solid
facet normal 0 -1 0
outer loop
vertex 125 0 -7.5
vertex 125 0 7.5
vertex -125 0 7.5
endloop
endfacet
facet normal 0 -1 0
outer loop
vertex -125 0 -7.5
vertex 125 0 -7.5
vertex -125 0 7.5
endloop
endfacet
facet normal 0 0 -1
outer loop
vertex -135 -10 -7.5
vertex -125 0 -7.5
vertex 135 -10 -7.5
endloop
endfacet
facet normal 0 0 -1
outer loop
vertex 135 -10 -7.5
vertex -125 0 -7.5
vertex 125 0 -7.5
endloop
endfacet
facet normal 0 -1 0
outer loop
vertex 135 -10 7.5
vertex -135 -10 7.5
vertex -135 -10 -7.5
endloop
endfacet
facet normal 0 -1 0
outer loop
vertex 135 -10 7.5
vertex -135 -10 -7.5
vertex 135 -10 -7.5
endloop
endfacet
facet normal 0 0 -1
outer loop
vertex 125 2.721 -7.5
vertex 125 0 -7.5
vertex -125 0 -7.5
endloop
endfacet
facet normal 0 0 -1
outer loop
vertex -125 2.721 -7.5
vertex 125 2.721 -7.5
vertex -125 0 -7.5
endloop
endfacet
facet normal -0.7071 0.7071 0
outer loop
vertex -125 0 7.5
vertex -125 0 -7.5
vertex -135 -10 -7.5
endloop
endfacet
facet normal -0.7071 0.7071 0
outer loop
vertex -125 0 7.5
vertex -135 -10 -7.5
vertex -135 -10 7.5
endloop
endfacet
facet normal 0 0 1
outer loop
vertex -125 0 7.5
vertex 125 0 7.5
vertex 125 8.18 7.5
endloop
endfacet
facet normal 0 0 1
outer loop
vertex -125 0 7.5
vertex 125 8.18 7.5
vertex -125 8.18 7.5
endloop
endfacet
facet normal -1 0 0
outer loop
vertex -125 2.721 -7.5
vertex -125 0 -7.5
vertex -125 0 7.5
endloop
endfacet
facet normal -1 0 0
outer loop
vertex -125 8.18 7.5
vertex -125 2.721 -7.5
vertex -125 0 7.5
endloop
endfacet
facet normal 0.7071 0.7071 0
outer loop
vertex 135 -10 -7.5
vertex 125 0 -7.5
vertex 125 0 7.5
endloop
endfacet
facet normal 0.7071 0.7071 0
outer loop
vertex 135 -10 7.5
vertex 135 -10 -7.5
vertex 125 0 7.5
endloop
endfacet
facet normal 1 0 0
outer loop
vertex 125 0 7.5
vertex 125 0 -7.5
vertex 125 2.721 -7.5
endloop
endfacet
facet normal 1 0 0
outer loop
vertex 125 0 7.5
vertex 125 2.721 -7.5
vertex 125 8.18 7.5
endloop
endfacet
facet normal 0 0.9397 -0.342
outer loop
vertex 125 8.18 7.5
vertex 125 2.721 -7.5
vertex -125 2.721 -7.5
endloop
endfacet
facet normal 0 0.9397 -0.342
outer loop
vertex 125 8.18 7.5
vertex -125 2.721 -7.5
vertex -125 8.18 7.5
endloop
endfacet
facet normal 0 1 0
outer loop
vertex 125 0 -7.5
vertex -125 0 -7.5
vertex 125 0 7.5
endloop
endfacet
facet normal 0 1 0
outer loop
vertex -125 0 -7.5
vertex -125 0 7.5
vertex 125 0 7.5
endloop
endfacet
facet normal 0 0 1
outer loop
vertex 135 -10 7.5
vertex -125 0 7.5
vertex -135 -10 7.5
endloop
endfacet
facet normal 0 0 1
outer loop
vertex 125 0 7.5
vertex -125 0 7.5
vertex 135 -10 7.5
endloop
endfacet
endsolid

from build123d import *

# Parameters (mm, degrees)
F0_W        = 270
F0_H        = 15
F1_DEPTH    = 10
F2_SIZE     = 9.99999
F3_W        = 250.00002
F3_H        = 15
F4_DEPTH    = 10
F5_T1_DEPTH = 353.767809302


# Not quite as in the source:
# - a fillet or chamfer that OpenCascade refuses, or shapes differently, is made with other operations: its cross-section is extruded or revolved along the edge and cut away or added
# - a fillet or chamfer is up to 0.001 mm smaller than in the source, because OpenCascade refuses the exact size
# - a feature of the source that left no trace in its solid (it failed there, or was rolled back) is left out


with BuildPart() as f1:
    # F0 (on Front) → F1 (new body)
    with BuildSketch(Plane.XZ):
        Rectangle(F0_W, F0_H)
    extrude(amount=F1_DEPTH)

    # F2 (size 10 in the source; OpenCascade refuses exactly that, so slightly less here)
    f2_edges = [f1.edges().sort_by_distance(p)[0] for p in [
        (135, 0, 0),
        (-135, 0, 0),
    ]]
    chamfer(f2_edges, length=F2_SIZE)


with BuildPart() as f4:
    # F3 (on face) → F4 (new body)
    with BuildSketch(Plane(origin=(0, 0, 0), x_dir=(-1, 0, 0), z_dir=(0, 1, 0))):
        Rectangle(F3_W, F3_H)
    extrude(amount=F4_DEPTH)

    # F5: chamfer of 20 x 7.2794046853 on 1 edges, made by hand

    # F5_s2 → F5_t1 (cut)
    with BuildSketch(Plane.YZ.offset(-176.883904651)):
        Polygon((2.7205953147, -7.5), (10, 12.5), (10, -7.5), align=None)
    extrude(amount=F5_T1_DEPTH, mode=Mode.SUBTRACT)


solid = Compound([f1.part, f4.part])
